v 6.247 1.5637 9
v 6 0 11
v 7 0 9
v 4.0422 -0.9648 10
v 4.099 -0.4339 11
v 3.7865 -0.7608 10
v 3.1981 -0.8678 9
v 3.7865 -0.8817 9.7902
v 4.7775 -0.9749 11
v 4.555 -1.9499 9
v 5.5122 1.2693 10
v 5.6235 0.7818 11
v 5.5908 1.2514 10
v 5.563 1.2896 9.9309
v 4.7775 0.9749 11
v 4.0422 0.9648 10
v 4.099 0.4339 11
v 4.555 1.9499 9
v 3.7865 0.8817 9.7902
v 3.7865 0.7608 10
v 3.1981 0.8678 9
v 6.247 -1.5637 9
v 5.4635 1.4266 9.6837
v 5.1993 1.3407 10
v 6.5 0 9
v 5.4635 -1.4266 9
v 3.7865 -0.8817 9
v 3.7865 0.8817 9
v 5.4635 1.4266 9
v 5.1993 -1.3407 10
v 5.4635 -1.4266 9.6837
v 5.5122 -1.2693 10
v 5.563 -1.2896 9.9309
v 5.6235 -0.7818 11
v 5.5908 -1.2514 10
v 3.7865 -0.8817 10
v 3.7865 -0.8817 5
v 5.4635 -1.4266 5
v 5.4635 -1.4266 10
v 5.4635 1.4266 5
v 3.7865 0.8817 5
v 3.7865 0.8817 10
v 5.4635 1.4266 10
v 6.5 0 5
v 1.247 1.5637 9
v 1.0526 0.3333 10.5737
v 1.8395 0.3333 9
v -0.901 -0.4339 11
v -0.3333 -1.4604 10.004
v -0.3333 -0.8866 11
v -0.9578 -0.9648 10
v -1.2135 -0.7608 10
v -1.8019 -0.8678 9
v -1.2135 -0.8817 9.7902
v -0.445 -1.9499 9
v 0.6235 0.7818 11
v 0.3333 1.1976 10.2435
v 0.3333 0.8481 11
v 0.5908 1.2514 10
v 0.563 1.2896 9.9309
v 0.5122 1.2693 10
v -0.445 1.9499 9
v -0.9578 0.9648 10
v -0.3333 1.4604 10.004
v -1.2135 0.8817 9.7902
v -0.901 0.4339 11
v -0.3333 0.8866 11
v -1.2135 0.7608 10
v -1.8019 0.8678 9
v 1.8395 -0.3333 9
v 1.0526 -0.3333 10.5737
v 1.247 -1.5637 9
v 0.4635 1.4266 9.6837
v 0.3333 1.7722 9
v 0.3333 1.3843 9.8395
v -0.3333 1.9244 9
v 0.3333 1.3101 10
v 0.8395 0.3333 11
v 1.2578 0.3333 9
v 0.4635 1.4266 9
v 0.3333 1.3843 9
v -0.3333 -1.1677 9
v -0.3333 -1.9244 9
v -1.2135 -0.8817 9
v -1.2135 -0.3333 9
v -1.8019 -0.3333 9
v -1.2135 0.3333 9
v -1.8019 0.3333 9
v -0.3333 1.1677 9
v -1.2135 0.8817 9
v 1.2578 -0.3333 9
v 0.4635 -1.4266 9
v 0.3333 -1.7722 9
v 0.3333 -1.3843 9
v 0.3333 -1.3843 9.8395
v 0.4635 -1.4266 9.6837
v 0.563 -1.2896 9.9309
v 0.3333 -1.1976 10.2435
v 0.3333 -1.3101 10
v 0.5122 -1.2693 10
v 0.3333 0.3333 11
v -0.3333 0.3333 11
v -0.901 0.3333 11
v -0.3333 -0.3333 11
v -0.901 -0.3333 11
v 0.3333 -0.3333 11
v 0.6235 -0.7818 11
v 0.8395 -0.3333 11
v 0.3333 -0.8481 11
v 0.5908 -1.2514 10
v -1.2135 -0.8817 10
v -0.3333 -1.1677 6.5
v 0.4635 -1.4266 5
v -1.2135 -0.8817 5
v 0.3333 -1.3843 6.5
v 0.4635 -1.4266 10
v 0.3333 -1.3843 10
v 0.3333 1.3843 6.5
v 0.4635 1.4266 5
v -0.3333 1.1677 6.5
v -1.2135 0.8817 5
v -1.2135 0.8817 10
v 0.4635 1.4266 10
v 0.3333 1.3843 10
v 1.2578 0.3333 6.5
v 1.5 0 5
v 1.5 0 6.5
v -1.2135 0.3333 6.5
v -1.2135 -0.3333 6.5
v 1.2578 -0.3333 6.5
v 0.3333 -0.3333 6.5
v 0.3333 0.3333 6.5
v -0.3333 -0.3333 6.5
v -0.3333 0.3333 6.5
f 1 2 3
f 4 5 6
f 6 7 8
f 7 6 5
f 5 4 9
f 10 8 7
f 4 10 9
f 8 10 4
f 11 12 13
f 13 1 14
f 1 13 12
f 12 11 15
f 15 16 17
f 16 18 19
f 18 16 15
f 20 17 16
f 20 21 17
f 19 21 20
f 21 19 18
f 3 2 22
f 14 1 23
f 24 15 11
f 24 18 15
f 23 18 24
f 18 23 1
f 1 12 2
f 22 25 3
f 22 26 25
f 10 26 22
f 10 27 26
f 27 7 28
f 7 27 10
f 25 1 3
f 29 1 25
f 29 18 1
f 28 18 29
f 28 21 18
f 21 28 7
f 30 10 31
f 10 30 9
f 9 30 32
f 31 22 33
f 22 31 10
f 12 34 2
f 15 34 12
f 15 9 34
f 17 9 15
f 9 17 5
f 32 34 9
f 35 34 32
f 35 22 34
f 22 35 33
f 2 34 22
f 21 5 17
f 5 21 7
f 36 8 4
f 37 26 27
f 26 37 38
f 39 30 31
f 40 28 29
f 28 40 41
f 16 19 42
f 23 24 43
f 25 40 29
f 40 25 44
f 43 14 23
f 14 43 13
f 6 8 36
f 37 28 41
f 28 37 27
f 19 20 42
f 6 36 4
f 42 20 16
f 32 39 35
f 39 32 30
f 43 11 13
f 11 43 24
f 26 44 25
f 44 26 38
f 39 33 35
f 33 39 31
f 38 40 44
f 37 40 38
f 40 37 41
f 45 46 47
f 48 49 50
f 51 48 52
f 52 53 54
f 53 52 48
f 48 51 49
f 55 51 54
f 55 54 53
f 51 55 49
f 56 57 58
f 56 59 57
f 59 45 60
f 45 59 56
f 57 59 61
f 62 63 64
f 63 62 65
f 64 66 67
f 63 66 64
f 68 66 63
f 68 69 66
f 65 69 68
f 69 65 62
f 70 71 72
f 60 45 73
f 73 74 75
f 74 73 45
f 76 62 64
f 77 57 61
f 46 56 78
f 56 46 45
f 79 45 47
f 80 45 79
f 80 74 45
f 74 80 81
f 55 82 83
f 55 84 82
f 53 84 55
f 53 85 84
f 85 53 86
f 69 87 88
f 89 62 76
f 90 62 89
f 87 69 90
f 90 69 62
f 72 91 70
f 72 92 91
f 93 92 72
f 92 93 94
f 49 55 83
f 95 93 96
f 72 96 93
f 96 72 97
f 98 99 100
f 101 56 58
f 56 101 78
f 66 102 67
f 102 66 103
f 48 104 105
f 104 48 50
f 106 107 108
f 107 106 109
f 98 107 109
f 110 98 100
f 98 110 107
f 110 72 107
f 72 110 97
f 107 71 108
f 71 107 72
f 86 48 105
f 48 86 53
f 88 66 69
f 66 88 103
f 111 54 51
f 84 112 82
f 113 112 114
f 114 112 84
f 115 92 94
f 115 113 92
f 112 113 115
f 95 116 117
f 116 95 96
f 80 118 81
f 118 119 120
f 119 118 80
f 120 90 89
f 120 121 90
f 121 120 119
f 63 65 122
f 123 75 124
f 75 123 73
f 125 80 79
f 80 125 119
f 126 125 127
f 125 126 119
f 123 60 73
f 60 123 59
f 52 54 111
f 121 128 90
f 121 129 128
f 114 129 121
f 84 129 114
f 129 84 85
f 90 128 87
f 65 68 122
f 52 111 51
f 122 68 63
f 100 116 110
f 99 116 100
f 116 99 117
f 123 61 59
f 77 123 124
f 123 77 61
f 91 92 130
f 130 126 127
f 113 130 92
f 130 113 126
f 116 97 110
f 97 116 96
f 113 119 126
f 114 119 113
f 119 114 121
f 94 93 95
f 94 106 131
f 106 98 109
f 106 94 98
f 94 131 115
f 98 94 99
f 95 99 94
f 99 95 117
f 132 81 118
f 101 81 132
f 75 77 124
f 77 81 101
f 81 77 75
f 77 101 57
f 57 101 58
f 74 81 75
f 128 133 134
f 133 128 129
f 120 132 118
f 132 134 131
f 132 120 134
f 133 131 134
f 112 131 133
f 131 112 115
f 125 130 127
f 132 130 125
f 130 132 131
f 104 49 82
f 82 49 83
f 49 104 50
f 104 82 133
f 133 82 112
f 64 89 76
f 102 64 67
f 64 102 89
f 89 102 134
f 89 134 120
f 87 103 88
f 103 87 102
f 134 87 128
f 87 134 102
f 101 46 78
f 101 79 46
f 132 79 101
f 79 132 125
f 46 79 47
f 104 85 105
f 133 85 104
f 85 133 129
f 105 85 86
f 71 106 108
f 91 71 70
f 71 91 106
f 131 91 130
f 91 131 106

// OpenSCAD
//snap fit connectors

// column width
w=20;
// main column height
h=10;
// snap fit width
s=2;
//snap fit height
f=2;
// mini column height
m=5;
// tolerance
t=0.5;

// $fn=100;

module snapfitA(){
	union(){
		translate([0,0,h/2+m])cylinder (r1=s, r2=1, h=f, center=true); //arrow head
		translate([0,0,h/2+m/2])cylinder(r=s-t, h=m, center=true); //mini column
	}
}

module snapfitB(){
	difference(){
		snapfitA();
		translate([0,0,h/2+m]) cube([s/3,s*2,f+m], center=true); //cut in snap fit
		translate([0,0,h/2+m]) rotate([0,0,90]) cube([s/3,s*2,f+m], center=true); //cut in snap fit
	}
}

translate([5,0,0]) snapfitA();
translate([0,0,0]) snapfitB();
